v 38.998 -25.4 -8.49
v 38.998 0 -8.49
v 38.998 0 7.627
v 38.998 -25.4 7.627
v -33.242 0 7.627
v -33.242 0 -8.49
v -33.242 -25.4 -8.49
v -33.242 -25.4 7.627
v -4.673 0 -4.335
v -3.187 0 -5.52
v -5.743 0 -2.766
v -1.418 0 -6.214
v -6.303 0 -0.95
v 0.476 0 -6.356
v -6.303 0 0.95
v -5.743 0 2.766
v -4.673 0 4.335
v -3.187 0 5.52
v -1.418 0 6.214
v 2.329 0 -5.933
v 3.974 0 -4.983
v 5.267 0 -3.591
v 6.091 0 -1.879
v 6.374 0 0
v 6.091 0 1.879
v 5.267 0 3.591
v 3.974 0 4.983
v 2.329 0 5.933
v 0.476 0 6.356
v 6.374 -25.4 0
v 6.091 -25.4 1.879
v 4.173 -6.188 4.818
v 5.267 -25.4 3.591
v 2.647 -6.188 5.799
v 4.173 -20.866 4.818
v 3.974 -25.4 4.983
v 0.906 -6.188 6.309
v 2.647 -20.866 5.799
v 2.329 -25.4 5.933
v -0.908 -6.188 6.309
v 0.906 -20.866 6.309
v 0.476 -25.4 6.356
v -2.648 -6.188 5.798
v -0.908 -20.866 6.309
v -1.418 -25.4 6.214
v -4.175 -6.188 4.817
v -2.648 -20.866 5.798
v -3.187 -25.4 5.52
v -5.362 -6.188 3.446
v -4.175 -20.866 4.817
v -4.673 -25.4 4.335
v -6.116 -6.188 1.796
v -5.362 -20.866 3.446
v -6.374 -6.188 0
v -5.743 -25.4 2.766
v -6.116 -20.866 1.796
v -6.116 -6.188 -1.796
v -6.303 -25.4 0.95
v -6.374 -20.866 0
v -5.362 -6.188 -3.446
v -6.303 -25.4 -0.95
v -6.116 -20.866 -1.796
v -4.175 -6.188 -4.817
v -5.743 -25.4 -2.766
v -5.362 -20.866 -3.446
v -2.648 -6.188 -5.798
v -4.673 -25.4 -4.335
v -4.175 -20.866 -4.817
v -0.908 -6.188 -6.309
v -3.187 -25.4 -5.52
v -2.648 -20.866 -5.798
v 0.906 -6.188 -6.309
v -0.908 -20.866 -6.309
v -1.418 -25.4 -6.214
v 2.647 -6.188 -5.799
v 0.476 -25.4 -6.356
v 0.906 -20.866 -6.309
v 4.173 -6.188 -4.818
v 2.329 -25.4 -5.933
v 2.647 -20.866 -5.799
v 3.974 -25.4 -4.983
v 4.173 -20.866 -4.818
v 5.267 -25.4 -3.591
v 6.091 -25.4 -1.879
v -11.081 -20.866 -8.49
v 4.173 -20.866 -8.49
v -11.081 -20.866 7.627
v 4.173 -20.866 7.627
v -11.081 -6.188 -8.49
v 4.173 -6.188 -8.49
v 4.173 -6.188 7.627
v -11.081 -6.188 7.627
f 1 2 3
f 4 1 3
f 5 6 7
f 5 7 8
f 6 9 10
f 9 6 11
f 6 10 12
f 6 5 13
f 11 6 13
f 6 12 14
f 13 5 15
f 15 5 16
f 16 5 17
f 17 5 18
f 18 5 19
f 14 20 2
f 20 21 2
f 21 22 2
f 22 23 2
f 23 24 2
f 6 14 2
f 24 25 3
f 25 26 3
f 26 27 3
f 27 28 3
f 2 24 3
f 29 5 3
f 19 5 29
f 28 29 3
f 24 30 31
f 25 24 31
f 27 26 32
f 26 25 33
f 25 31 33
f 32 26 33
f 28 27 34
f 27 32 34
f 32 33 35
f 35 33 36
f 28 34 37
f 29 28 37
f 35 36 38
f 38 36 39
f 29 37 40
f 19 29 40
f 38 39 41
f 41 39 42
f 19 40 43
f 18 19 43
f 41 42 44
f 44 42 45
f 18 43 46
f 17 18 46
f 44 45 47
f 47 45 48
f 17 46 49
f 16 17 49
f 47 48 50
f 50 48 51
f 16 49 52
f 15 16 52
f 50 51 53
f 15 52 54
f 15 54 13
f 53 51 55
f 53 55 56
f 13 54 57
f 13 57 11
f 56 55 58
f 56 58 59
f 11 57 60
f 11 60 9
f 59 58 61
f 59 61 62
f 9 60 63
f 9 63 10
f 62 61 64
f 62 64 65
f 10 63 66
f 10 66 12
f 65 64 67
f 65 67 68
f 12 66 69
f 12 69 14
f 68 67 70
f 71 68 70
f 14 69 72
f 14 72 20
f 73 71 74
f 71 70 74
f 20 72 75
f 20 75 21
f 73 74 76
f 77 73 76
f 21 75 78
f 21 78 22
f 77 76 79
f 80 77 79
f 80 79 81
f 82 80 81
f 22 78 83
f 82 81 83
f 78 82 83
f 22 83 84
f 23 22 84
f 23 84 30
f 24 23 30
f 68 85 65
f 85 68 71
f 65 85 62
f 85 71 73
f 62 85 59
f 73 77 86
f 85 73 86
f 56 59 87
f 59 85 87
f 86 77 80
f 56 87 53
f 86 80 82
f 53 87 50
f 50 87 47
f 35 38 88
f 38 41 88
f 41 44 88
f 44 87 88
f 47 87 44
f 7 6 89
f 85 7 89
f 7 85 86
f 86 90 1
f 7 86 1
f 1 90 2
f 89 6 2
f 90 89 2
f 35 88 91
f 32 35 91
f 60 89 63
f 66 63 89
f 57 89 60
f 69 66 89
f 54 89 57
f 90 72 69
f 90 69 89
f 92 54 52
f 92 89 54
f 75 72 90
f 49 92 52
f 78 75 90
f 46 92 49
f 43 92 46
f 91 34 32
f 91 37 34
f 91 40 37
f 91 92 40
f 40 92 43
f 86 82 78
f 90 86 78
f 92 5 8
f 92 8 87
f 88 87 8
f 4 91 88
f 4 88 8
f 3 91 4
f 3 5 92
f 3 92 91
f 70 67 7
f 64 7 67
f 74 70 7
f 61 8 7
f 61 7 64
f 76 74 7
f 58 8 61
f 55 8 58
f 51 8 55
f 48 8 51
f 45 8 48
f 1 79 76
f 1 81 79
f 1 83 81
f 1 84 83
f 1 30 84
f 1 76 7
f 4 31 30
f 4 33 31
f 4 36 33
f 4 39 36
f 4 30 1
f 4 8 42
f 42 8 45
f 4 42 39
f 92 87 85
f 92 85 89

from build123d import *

# Parameters (mm, degrees)
F0_W          = 72.2392462194
F0_H          = 16.11712249
F1_DEPTH      = 25.4
F2_W          = 15.2537054382
F2_H          = 14.6780936047
F3_DEPTH      = 50.8
F3_DEPTH_BACK = 25.4
F5_R          = 6.3741022215
F6_DEPTH      = 25.401


with BuildPart() as f1:
    # F0 (on Front) → F1 (new body)
    with BuildSketch(Plane.XZ):
        with Locations((2.8780568391, -0.4317087587)):
            Rectangle(F0_W, F0_H)
    extrude(amount=F1_DEPTH)

    # F2 (on Top) → F3 (cut, two sides)
    with BuildSketch(Plane.XY) as f3_sk:
        with Locations((-3.4536684398, -13.5268704034)):
            Rectangle(F2_W, F2_H)
    extrude(amount=-F3_DEPTH, mode=Mode.SUBTRACT)
    extrude(f3_sk.sketch, amount=F3_DEPTH_BACK, mode=Mode.SUBTRACT)

    # F5 (on face) → F6 (cut, through all)
    with BuildSketch(Plane.XZ.offset(25.4)):
        Circle(F5_R)
    extrude(amount=-F6_DEPTH, mode=Mode.SUBTRACT)


solid = f1.part
